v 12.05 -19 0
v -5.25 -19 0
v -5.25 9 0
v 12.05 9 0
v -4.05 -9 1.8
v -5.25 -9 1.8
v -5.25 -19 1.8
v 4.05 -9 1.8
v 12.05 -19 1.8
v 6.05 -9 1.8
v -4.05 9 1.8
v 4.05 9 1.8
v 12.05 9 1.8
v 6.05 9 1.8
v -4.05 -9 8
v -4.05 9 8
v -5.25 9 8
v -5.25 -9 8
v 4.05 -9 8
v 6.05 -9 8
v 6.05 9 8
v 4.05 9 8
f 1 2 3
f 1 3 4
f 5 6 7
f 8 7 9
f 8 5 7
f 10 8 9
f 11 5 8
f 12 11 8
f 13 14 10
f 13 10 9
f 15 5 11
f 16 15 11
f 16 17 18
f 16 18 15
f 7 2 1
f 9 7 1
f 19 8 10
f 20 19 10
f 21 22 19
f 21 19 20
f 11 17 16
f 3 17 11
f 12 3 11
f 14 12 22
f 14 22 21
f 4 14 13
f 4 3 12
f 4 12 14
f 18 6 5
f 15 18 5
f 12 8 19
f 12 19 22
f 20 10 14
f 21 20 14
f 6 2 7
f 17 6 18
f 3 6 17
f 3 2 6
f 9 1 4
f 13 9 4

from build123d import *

# Parameters (mm, degrees)
F0_W     = 8.1
F0_H     = 18
F1_DEPTH = 1.8
F0_W_2   = 1.2
F0_W_3   = 2
F2_DEPTH = 8


# Not quite as in the source:
# - a feature names something its author has since deleted; it is built from what else it names


with BuildPart() as f1:
    # F0 (on Top) → F1 (new body)
    with BuildSketch(Plane.XY):
        Polygon((6.05, -9), (4.05, -9), (-4.05, -9), (-5.25, -9), (-5.25, -19), (6.05, -19), align=None)
        Rectangle(F0_W, F0_H)
        Polygon((6.05, 9), (6.05, -9), (6.05, -19), (12.05, -19), (12.05, 9), align=None)
    extrude(amount=F1_DEPTH)

    # F0 (on Top) → F2 (join)
    with BuildSketch(Plane.XY):
        with Locations((-4.65, 0)):
            Rectangle(F0_W_2, F0_H)
        with Locations((5.05, 0)):
            Rectangle(F0_W_3, F0_H)
    extrude(amount=F2_DEPTH)


solid = f1.part
